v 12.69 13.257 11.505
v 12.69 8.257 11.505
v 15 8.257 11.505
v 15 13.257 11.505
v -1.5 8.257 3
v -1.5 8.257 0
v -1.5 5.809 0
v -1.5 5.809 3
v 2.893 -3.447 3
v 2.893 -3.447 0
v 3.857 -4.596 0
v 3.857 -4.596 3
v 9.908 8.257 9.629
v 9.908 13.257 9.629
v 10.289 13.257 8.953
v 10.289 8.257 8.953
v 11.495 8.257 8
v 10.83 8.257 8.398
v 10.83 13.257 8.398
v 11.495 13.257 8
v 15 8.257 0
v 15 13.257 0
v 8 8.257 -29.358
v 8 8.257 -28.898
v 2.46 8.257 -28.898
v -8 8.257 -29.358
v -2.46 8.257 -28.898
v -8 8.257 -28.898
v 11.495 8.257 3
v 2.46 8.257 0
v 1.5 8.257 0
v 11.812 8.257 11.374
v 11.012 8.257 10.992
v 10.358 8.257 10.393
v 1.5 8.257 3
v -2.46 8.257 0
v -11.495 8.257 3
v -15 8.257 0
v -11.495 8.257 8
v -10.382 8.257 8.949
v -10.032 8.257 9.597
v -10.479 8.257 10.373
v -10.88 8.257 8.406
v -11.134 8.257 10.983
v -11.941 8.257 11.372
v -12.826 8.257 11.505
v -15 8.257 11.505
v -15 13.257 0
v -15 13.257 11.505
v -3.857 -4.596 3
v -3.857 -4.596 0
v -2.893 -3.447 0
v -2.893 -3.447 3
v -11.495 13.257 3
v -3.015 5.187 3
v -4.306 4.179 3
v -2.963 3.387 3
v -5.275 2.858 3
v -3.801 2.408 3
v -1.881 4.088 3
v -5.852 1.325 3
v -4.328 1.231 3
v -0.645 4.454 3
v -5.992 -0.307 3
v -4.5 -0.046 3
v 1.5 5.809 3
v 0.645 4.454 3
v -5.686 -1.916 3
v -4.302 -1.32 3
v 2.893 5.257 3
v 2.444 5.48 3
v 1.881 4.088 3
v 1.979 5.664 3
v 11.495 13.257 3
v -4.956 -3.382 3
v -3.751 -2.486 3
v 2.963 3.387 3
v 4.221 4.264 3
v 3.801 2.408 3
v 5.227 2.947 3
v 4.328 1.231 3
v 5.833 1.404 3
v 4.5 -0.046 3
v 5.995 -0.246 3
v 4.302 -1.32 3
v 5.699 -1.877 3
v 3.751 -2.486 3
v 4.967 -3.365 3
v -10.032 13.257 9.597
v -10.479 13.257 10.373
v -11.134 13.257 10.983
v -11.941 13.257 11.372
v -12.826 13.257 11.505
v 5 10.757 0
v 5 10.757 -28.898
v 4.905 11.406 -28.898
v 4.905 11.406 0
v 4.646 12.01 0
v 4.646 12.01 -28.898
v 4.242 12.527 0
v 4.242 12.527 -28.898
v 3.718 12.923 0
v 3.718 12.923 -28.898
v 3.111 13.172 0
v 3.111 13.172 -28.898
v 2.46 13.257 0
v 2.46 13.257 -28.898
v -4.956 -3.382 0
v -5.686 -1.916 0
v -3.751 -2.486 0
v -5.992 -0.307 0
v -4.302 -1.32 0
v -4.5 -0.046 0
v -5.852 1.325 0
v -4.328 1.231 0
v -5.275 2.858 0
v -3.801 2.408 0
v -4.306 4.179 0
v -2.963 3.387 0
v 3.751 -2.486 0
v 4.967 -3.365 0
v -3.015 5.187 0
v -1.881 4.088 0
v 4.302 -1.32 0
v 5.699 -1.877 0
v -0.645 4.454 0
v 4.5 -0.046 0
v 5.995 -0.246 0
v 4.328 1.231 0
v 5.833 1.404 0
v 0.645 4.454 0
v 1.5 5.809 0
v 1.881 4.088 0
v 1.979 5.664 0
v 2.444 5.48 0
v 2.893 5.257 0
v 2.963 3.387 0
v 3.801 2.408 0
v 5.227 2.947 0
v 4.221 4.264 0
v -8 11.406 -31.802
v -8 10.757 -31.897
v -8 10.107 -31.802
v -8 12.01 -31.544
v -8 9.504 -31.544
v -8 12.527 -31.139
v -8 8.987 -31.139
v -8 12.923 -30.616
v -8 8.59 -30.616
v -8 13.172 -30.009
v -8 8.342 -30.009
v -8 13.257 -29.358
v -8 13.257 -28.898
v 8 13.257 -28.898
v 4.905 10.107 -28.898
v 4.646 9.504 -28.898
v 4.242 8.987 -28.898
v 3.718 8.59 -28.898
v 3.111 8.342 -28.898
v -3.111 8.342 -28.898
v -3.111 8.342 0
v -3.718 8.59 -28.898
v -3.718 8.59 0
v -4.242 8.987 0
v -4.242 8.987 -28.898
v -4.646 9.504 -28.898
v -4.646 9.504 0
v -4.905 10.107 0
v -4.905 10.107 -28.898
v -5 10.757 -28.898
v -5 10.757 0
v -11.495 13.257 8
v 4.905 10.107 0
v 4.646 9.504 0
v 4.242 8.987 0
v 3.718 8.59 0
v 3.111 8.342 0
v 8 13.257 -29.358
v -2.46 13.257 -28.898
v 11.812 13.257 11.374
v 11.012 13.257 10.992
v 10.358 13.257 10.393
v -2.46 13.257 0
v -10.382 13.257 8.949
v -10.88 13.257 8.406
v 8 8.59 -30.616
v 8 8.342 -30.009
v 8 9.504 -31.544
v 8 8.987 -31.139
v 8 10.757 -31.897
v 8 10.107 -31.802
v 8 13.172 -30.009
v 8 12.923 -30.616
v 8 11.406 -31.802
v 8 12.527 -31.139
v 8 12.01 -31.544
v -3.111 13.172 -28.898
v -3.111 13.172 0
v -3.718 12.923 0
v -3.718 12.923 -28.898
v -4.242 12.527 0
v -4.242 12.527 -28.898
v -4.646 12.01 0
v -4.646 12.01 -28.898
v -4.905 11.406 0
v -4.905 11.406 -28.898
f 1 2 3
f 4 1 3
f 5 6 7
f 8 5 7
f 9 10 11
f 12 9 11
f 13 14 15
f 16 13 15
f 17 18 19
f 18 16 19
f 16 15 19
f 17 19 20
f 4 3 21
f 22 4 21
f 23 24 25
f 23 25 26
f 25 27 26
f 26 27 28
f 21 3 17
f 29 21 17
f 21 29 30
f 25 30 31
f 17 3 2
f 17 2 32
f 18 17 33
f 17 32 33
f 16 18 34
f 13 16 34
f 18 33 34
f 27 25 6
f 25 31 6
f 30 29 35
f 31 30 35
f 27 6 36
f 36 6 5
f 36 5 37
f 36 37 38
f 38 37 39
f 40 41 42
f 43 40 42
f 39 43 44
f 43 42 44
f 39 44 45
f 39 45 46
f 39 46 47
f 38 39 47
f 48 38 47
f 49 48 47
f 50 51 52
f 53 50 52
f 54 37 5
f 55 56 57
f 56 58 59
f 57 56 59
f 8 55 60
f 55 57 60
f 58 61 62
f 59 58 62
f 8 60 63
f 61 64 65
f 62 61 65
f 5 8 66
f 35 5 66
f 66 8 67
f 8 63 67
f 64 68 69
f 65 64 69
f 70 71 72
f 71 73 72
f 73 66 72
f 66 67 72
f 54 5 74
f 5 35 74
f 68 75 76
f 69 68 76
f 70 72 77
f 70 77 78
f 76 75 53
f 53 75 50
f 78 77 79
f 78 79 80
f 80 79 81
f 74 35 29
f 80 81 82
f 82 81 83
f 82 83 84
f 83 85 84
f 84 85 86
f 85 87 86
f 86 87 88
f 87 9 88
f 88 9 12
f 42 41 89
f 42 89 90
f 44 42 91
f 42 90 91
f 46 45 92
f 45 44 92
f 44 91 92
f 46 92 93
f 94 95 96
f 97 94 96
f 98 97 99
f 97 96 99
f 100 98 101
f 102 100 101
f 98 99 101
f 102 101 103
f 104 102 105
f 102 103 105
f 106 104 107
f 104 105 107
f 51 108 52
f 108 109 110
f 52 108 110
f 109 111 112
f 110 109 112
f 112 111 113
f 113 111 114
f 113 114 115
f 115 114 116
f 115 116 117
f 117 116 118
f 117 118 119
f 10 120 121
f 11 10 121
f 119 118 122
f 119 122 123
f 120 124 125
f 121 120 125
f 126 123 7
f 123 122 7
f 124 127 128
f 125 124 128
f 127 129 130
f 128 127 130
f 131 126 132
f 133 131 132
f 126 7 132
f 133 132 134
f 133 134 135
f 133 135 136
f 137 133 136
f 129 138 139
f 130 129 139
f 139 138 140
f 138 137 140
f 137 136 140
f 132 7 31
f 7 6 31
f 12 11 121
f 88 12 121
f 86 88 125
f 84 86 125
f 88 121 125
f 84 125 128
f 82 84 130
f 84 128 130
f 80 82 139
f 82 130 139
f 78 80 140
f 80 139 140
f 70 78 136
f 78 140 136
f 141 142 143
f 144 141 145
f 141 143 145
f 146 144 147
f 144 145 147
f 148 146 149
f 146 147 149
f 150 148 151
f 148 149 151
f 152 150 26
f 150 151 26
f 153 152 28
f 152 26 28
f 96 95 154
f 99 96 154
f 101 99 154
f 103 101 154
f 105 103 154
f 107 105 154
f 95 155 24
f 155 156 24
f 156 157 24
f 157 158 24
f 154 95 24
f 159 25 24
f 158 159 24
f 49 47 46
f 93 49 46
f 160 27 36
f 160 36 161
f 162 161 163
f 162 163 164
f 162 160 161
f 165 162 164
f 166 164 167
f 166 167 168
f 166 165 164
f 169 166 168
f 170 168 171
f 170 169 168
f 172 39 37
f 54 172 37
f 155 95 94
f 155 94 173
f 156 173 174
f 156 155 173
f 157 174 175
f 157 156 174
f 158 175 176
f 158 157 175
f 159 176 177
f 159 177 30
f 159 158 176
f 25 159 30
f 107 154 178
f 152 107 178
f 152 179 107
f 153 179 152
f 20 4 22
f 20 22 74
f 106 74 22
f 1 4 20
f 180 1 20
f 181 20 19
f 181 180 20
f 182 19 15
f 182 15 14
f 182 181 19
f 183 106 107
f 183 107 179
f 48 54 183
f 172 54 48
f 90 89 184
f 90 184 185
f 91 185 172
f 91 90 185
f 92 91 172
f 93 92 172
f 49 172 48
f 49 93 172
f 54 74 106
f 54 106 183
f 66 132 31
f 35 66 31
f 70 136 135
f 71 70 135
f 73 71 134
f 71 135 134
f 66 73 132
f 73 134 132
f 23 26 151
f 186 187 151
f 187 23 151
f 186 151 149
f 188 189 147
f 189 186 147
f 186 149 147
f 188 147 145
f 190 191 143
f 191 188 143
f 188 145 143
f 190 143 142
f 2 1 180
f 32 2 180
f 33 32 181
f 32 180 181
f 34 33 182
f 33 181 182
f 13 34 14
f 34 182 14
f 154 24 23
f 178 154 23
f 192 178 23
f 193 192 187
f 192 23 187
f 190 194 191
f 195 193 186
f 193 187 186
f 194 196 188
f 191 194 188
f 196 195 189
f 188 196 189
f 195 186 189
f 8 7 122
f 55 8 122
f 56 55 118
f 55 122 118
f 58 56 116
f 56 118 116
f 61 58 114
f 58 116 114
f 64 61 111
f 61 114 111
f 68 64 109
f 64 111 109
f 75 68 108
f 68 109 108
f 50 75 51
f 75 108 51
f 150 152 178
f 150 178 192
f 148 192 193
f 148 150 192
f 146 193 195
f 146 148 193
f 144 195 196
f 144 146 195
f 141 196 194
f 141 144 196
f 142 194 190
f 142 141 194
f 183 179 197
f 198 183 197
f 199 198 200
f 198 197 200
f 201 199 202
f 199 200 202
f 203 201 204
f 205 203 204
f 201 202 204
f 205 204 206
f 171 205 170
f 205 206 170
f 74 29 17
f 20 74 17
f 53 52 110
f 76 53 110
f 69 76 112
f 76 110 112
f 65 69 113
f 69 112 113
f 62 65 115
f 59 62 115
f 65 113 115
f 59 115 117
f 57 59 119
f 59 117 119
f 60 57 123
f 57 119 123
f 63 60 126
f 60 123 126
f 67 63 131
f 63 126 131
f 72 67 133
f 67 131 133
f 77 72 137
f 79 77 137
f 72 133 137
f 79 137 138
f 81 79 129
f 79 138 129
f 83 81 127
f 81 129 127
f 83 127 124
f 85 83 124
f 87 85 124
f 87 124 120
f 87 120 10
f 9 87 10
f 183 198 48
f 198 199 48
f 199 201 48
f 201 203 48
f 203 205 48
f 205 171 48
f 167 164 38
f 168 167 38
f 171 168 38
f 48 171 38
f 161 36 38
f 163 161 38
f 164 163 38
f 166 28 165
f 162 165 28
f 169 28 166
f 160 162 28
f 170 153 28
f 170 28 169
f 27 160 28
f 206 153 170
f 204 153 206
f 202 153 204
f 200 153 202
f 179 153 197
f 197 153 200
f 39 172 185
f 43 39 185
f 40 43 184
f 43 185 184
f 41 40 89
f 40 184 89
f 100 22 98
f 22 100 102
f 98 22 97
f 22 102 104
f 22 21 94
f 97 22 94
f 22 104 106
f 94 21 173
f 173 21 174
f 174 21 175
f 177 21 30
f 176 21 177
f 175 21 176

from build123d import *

# Parameters (mm, degrees)
F1_DEPTH    = 3
F3_DEPTH    = 5
F4_T1_DEPTH = 20
F4_T3_DEPTH = 18.7590602534
F4_T5_DEPTH = 18.4414894703
F5_T1_DEPTH = 28.8976125792
F5_T3_DEPTH = 28.7


# Not quite as in the source:
# - a fillet or chamfer that OpenCascade refuses, or shapes differently, is made with other operations: its cross-section is extruded or revolved along the edge and cut away or added


with BuildPart() as f1:
    # F0 (on Top) → F1 (new body)
    with BuildSketch(Plane.XY):
        with BuildLine():
            ThreePointArc((-2.8925442436, -3.447199994), (0, 4.5), (2.8925442436, -3.447199994))
            Line((2.8925442436, -3.447199994), (3.8567256581, -4.5962666587))
            ThreePointArc((3.8567256581, -4.5962666587), (5.9714768944, 0.5843489538), (2.8925442436, 5.2567278605))
            ThreePointArc((2.8925442436, 5.2567278605), (2.2135929139, 5.5767379723), (1.5, 5.8094750193))
            Line((1.5, 5.8094750193), (1.5, 8.2567278605))
            Line((1.5, 8.2567278605), (-1.5, 8.2567278605))
            Line((-1.5, 8.2567278605), (-1.5, 5.8094750193))
            ThreePointArc((-1.5, 5.8094750193), (-5.8517939481, 1.3253330104), (-3.8567256581, -4.5962666587))
            Line((-3.8567256581, -4.5962666587), (-2.8925442436, -3.447199994))
        make_face()
    extrude(amount=F1_DEPTH)

    # F2 (on face) → F3 (join)
    with BuildSketch(Plane(origin=(0, 8.2567278605, 0), x_dir=(-1, 0, 0), z_dir=(0, 1, 0))):
        Polygon((-15, 0), (-5, 0), (-5, -28.8976125792), (-8, -28.8976125792), (-8, -31.8976125792), (8, -31.8976125792), (8, -28.8976125792), (5, -28.8976125792), (5, 0), (15, 0), (15, 3), (15, 8), (15, 11.5052), (9.8263609009, 11.5052), (9.8263609009, 8), (11.4948, 8), (11.4948, 3), (0, 3), (-11.4948, 3), (-11.4948, 8), (-9.6895930523, 8), (-9.6895930523, 11.5052), (-13.1947930523, 11.5052), (-15, 11.5052), (-15, 8), (-15, 3), align=None)
    extrude(amount=F3_DEPTH)

    # F4: fillet of radius 3 on 4 edges, made by hand

    # F4_s2 → F4_t1 (cut)
    with BuildSketch(Plane.XZ.offset(-20.7567278605)):
        with BuildLine():
            ThreePointArc((12.6895930523, 11.5052), (10.5682727087, 10.6265203436), (9.6895930523, 8.5052))
            Line((9.6895930523, 8.5052), (9.6895930523, 11.5052))
            Line((9.6895930523, 11.5052), (12.6895930523, 11.5052))
        make_face()
        with BuildLine():
            ThreePointArc((-9.8263609009, 8.5052), (-10.7050405574, 10.6265203436), (-12.8263609009, 11.5052))
            Line((-12.8263609009, 11.5052), (-9.8263609009, 11.5052))
            Line((-9.8263609009, 11.5052), (-9.8263609009, 8.5052))
        make_face()
    extrude(amount=F4_T1_DEPTH, mode=Mode.SUBTRACT)

    # F4_s4 → F4_t3 (cut)
    with BuildSketch(Plane.XZ.offset(-20.1362579871)):
        with BuildLine():
            ThreePointArc((9.6895930523, 10.7518120507), (10.1811693284, 9.1062694588), (11.4948, 8))
            Line((11.4948, 8), (9.6895930523, 8))
            Line((9.6895930523, 8), (9.6895930523, 10.7518120507))
        make_face()
    extrude(amount=F4_T3_DEPTH, mode=Mode.SUBTRACT)

    # F4_s6 → F4_t5 (cut)
    with BuildSketch(Plane.XZ.offset(-19.9774725956)):
        with BuildLine():
            ThreePointArc((-11.4948, 8), (-10.2773726013, 9.1063185489), (-9.8263609009, 10.6882978941))
            Line((-9.8263609009, 10.6882978941), (-9.8263609009, 8))
            Line((-9.8263609009, 8), (-11.4948, 8))
        make_face()
    extrude(amount=F4_T5_DEPTH, mode=Mode.SUBTRACT)

    # F5: fillet of radius 2.54 on 6 edges, made by hand

    # F5_s2 → F5_t1 (cut)
    with BuildSketch(Plane.XY.offset(-28.8976125792)):
        with BuildLine():
            ThreePointArc((5, 10.7167278605), (4.2560512242, 12.5127790847), (2.46, 13.2567278605))
            Line((2.46, 13.2567278605), (5, 13.2567278605))
            Line((5, 13.2567278605), (5, 10.7167278605))
        make_face()
        with BuildLine():
            ThreePointArc((5, 10.7967278605), (4.2560512242, 9.0006766362), (2.46, 8.2567278605))
            Line((2.46, 8.2567278605), (5, 8.2567278605))
            Line((5, 8.2567278605), (5, 10.7967278605))
        make_face()
        with BuildLine():
            ThreePointArc((-2.46, 8.2567278605), (-4.2560512242, 9.0006766362), (-5, 10.7967278605))
            Line((-5, 10.7967278605), (-5, 8.2567278605))
            Line((-5, 8.2567278605), (-2.46, 8.2567278605))
        make_face()
        with BuildLine():
            ThreePointArc((-2.46, 13.2567278605), (-4.2560512242, 12.5127790847), (-5, 10.7167278605))
            Line((-5, 10.7167278605), (-5, 13.2567278605))
            Line((-5, 13.2567278605), (-2.46, 13.2567278605))
        make_face()
    extrude(amount=F5_T1_DEPTH, mode=Mode.SUBTRACT)

    # F5_s4 → F5_t3 (cut)
    with BuildSketch(Plane.YZ.offset(-14.35)):
        with BuildLine():
            ThreePointArc((8.2567278605, -29.3576125792), (9.0006766362, -31.1536638034), (10.7967278605, -31.8976125792))
            Line((10.7967278605, -31.8976125792), (8.2567278605, -31.8976125792))
            Line((8.2567278605, -31.8976125792), (8.2567278605, -29.3576125792))
        make_face()
        with BuildLine():
            ThreePointArc((13.2567278605, -29.3576125792), (12.5127790847, -31.1536638034), (10.7167278605, -31.8976125792))
            Line((10.7167278605, -31.8976125792), (13.2567278605, -31.8976125792))
            Line((13.2567278605, -31.8976125792), (13.2567278605, -29.3576125792))
        make_face()
    extrude(amount=F5_T3_DEPTH, mode=Mode.SUBTRACT)


solid = f1.part
